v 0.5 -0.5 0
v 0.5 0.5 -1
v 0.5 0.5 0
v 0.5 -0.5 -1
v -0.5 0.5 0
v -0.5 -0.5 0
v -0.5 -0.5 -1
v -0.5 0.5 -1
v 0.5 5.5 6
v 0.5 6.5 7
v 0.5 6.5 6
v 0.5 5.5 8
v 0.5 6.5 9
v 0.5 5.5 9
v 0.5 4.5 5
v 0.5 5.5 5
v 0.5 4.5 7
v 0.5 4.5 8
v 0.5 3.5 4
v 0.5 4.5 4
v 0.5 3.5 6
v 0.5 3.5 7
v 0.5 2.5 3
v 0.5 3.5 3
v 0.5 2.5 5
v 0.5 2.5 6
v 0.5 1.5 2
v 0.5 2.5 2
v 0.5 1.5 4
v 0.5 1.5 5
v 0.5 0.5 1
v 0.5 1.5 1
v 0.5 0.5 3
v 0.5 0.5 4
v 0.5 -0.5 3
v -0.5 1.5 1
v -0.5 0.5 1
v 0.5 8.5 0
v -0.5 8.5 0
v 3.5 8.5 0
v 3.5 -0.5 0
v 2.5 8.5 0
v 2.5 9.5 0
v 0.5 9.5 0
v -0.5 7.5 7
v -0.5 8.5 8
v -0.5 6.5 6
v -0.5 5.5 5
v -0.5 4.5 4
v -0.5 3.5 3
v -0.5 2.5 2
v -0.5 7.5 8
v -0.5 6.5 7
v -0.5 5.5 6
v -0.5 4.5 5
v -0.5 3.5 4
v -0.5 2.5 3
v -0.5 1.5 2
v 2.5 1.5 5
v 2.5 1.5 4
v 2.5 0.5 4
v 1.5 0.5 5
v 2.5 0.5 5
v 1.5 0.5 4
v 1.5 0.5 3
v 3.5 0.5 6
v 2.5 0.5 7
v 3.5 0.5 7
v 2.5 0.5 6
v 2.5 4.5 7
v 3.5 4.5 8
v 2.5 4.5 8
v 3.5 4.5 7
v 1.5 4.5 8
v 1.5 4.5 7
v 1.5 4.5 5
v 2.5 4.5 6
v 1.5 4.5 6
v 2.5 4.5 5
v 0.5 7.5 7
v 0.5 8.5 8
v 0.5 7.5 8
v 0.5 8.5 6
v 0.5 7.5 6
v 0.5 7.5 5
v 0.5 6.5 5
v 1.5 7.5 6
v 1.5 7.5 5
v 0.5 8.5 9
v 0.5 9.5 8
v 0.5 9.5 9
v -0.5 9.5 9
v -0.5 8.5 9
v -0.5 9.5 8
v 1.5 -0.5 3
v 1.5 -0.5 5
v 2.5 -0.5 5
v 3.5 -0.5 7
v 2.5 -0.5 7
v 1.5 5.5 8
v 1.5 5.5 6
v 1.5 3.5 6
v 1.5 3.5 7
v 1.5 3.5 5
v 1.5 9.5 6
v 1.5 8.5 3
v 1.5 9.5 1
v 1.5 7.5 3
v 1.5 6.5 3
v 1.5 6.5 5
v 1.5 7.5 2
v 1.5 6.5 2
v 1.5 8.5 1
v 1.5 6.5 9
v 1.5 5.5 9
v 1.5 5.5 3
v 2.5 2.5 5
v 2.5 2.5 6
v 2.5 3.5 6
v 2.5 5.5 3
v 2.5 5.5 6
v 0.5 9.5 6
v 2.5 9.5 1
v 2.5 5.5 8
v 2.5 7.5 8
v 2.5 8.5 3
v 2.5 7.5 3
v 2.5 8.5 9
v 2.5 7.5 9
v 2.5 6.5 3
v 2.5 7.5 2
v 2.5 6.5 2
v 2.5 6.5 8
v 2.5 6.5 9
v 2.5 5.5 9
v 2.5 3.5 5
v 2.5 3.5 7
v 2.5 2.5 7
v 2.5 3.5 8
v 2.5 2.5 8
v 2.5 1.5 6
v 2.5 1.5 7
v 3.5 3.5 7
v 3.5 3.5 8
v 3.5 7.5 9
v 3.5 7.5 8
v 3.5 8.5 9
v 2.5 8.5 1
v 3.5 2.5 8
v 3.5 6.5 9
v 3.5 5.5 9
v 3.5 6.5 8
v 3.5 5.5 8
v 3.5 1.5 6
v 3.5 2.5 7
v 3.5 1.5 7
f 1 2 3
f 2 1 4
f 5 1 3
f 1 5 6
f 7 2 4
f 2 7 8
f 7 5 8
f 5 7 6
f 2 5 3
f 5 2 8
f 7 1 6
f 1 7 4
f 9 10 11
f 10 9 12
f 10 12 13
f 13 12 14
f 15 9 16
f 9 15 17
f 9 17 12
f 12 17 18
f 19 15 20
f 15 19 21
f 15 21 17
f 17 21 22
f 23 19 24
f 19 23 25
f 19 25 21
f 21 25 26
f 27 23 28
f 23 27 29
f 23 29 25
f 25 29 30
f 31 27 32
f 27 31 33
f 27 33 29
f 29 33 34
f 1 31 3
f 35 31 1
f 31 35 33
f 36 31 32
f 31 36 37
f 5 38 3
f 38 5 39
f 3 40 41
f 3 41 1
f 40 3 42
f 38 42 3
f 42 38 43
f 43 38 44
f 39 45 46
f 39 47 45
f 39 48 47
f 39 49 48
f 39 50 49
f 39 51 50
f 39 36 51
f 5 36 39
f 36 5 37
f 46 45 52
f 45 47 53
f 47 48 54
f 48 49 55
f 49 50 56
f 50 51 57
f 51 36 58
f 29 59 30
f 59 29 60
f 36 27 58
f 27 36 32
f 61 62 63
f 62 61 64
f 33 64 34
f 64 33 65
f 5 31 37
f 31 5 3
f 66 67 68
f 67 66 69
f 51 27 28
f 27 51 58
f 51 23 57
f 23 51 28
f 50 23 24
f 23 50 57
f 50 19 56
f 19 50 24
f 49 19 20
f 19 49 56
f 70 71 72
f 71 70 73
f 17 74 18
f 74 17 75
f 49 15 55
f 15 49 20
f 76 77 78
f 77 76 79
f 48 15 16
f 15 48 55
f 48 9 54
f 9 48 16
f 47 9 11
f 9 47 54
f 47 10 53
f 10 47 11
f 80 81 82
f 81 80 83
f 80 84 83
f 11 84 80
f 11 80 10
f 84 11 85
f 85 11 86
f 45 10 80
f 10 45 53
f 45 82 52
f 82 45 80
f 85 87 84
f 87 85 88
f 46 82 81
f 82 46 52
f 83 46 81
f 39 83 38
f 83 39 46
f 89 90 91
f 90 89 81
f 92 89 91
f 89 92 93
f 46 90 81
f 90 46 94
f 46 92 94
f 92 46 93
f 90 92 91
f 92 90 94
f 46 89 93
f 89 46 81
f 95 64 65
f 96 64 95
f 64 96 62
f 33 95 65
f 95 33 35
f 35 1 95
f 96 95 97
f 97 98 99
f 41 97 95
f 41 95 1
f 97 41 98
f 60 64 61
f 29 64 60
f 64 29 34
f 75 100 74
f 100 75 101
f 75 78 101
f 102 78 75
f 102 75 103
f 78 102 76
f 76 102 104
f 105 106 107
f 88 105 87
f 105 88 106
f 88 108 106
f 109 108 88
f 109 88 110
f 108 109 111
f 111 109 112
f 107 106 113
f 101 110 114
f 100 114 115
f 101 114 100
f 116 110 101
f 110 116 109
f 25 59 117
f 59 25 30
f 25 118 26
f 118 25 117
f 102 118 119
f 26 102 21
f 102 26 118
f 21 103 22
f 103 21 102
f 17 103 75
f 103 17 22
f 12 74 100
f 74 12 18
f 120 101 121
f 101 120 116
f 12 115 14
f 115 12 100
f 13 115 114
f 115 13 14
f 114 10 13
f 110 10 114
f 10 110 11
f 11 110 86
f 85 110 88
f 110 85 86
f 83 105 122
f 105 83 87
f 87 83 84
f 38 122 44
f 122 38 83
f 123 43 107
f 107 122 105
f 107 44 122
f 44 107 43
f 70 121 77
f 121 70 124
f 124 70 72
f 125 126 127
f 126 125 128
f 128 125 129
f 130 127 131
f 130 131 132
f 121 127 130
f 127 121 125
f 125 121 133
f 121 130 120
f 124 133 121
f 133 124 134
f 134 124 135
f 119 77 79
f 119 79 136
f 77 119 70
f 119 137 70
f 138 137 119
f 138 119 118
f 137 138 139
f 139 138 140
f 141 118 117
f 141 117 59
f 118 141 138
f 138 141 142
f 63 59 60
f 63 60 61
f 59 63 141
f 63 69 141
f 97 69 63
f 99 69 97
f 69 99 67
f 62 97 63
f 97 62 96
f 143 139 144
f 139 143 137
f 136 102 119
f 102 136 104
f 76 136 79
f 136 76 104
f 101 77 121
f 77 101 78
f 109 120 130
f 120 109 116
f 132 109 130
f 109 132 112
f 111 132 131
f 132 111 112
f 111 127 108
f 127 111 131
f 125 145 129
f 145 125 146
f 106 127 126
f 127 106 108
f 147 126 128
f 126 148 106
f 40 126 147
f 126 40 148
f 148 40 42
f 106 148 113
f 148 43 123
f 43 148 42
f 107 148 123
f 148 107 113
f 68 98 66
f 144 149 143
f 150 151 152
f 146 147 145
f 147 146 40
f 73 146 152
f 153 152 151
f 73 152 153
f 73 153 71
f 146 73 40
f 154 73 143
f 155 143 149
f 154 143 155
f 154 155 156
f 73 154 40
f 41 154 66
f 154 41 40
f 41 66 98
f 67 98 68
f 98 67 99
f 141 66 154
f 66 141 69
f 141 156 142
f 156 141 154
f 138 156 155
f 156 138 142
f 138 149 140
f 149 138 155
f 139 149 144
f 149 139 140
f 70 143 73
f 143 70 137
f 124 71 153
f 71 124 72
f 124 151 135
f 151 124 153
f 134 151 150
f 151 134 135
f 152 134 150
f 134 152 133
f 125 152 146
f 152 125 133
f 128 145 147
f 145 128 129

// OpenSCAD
union() {
    translate([0, 0, -0.5]) color([1, 0, 0]) cube([1, 1, 1], center=true);
    translate([0, 1, 0.5]) cube([1, 1, 1], center=true);
    translate([0, 2, 1.0]) cube([1, 1, 2], center=true);
    translate([0, 3, 1.5]) cube([1, 1, 3], center=true);
    translate([0, 4, 2.0]) cube([1, 1, 4], center=true);
    translate([0, 5, 2.5]) cube([1, 1, 5], center=true);
    translate([0, 6, 3.0]) cube([1, 1, 6], center=true);
    translate([0, 7, 3.5]) cube([1, 1, 7], center=true);
    translate([0, 8, 4.0]) cube([1, 1, 8], center=true);
    translate([0, 9, 8.5]) color([0, 0, 1]) cube([1, 1, 1], center=true);
    translate([1, 0, 1.5]) cube([1, 1, 3], center=true);
    translate([1, 1, 2.0]) cube([1, 1, 4], center=true);
    translate([1, 2, 2.5]) cube([1, 1, 5], center=true);
    translate([1, 3, 3.0]) cube([1, 1, 6], center=true);
    translate([1, 4, 3.5]) cube([1, 1, 7], center=true);
    translate([1, 5, 4.0]) cube([1, 1, 8], center=true);
    translate([1, 6, 4.5]) cube([1, 1, 9], center=true);
    translate([1, 7, 2.5]) cube([1, 1, 5], center=true);
    translate([1, 8, 3.0]) cube([1, 1, 6], center=true);
    translate([1, 9, 3.0]) cube([1, 1, 6], center=true);
    translate([2, 0, 2.5]) cube([1, 1, 5], center=true);
    translate([2, 1, 2.0]) cube([1, 1, 4], center=true);
    translate([2, 2, 2.5]) cube([1, 1, 5], center=true);
    translate([2, 3, 3.0]) cube([1, 1, 6], center=true);
    translate([2, 4, 2.5]) cube([1, 1, 5], center=true);
    translate([2, 5, 3.0]) cube([1, 1, 6], center=true);
    translate([2, 6, 1.5]) cube([1, 1, 3], center=true);
    translate([2, 7, 1.0]) cube([1, 1, 2], center=true);
    translate([2, 8, 1.5]) cube([1, 1, 3], center=true);
    translate([2, 9, 0.5]) cube([1, 1, 1], center=true);
    translate([3, 0, 3.5]) cube([1, 1, 7], center=true);
    translate([3, 1, 3.0]) cube([1, 1, 6], center=true);
    translate([3, 2, 3.5]) cube([1, 1, 7], center=true);
    translate([3, 3, 4.0]) cube([1, 1, 8], center=true);
    translate([3, 4, 3.5]) cube([1, 1, 7], center=true);
    translate([3, 5, 4.0]) cube([1, 1, 8], center=true);
    translate([3, 6, 4.5]) cube([1, 1, 9], center=true);
    translate([3, 7, 4.0]) cube([1, 1, 8], center=true);
    translate([3, 8, 4.5]) cube([1, 1, 9], center=true);
}
